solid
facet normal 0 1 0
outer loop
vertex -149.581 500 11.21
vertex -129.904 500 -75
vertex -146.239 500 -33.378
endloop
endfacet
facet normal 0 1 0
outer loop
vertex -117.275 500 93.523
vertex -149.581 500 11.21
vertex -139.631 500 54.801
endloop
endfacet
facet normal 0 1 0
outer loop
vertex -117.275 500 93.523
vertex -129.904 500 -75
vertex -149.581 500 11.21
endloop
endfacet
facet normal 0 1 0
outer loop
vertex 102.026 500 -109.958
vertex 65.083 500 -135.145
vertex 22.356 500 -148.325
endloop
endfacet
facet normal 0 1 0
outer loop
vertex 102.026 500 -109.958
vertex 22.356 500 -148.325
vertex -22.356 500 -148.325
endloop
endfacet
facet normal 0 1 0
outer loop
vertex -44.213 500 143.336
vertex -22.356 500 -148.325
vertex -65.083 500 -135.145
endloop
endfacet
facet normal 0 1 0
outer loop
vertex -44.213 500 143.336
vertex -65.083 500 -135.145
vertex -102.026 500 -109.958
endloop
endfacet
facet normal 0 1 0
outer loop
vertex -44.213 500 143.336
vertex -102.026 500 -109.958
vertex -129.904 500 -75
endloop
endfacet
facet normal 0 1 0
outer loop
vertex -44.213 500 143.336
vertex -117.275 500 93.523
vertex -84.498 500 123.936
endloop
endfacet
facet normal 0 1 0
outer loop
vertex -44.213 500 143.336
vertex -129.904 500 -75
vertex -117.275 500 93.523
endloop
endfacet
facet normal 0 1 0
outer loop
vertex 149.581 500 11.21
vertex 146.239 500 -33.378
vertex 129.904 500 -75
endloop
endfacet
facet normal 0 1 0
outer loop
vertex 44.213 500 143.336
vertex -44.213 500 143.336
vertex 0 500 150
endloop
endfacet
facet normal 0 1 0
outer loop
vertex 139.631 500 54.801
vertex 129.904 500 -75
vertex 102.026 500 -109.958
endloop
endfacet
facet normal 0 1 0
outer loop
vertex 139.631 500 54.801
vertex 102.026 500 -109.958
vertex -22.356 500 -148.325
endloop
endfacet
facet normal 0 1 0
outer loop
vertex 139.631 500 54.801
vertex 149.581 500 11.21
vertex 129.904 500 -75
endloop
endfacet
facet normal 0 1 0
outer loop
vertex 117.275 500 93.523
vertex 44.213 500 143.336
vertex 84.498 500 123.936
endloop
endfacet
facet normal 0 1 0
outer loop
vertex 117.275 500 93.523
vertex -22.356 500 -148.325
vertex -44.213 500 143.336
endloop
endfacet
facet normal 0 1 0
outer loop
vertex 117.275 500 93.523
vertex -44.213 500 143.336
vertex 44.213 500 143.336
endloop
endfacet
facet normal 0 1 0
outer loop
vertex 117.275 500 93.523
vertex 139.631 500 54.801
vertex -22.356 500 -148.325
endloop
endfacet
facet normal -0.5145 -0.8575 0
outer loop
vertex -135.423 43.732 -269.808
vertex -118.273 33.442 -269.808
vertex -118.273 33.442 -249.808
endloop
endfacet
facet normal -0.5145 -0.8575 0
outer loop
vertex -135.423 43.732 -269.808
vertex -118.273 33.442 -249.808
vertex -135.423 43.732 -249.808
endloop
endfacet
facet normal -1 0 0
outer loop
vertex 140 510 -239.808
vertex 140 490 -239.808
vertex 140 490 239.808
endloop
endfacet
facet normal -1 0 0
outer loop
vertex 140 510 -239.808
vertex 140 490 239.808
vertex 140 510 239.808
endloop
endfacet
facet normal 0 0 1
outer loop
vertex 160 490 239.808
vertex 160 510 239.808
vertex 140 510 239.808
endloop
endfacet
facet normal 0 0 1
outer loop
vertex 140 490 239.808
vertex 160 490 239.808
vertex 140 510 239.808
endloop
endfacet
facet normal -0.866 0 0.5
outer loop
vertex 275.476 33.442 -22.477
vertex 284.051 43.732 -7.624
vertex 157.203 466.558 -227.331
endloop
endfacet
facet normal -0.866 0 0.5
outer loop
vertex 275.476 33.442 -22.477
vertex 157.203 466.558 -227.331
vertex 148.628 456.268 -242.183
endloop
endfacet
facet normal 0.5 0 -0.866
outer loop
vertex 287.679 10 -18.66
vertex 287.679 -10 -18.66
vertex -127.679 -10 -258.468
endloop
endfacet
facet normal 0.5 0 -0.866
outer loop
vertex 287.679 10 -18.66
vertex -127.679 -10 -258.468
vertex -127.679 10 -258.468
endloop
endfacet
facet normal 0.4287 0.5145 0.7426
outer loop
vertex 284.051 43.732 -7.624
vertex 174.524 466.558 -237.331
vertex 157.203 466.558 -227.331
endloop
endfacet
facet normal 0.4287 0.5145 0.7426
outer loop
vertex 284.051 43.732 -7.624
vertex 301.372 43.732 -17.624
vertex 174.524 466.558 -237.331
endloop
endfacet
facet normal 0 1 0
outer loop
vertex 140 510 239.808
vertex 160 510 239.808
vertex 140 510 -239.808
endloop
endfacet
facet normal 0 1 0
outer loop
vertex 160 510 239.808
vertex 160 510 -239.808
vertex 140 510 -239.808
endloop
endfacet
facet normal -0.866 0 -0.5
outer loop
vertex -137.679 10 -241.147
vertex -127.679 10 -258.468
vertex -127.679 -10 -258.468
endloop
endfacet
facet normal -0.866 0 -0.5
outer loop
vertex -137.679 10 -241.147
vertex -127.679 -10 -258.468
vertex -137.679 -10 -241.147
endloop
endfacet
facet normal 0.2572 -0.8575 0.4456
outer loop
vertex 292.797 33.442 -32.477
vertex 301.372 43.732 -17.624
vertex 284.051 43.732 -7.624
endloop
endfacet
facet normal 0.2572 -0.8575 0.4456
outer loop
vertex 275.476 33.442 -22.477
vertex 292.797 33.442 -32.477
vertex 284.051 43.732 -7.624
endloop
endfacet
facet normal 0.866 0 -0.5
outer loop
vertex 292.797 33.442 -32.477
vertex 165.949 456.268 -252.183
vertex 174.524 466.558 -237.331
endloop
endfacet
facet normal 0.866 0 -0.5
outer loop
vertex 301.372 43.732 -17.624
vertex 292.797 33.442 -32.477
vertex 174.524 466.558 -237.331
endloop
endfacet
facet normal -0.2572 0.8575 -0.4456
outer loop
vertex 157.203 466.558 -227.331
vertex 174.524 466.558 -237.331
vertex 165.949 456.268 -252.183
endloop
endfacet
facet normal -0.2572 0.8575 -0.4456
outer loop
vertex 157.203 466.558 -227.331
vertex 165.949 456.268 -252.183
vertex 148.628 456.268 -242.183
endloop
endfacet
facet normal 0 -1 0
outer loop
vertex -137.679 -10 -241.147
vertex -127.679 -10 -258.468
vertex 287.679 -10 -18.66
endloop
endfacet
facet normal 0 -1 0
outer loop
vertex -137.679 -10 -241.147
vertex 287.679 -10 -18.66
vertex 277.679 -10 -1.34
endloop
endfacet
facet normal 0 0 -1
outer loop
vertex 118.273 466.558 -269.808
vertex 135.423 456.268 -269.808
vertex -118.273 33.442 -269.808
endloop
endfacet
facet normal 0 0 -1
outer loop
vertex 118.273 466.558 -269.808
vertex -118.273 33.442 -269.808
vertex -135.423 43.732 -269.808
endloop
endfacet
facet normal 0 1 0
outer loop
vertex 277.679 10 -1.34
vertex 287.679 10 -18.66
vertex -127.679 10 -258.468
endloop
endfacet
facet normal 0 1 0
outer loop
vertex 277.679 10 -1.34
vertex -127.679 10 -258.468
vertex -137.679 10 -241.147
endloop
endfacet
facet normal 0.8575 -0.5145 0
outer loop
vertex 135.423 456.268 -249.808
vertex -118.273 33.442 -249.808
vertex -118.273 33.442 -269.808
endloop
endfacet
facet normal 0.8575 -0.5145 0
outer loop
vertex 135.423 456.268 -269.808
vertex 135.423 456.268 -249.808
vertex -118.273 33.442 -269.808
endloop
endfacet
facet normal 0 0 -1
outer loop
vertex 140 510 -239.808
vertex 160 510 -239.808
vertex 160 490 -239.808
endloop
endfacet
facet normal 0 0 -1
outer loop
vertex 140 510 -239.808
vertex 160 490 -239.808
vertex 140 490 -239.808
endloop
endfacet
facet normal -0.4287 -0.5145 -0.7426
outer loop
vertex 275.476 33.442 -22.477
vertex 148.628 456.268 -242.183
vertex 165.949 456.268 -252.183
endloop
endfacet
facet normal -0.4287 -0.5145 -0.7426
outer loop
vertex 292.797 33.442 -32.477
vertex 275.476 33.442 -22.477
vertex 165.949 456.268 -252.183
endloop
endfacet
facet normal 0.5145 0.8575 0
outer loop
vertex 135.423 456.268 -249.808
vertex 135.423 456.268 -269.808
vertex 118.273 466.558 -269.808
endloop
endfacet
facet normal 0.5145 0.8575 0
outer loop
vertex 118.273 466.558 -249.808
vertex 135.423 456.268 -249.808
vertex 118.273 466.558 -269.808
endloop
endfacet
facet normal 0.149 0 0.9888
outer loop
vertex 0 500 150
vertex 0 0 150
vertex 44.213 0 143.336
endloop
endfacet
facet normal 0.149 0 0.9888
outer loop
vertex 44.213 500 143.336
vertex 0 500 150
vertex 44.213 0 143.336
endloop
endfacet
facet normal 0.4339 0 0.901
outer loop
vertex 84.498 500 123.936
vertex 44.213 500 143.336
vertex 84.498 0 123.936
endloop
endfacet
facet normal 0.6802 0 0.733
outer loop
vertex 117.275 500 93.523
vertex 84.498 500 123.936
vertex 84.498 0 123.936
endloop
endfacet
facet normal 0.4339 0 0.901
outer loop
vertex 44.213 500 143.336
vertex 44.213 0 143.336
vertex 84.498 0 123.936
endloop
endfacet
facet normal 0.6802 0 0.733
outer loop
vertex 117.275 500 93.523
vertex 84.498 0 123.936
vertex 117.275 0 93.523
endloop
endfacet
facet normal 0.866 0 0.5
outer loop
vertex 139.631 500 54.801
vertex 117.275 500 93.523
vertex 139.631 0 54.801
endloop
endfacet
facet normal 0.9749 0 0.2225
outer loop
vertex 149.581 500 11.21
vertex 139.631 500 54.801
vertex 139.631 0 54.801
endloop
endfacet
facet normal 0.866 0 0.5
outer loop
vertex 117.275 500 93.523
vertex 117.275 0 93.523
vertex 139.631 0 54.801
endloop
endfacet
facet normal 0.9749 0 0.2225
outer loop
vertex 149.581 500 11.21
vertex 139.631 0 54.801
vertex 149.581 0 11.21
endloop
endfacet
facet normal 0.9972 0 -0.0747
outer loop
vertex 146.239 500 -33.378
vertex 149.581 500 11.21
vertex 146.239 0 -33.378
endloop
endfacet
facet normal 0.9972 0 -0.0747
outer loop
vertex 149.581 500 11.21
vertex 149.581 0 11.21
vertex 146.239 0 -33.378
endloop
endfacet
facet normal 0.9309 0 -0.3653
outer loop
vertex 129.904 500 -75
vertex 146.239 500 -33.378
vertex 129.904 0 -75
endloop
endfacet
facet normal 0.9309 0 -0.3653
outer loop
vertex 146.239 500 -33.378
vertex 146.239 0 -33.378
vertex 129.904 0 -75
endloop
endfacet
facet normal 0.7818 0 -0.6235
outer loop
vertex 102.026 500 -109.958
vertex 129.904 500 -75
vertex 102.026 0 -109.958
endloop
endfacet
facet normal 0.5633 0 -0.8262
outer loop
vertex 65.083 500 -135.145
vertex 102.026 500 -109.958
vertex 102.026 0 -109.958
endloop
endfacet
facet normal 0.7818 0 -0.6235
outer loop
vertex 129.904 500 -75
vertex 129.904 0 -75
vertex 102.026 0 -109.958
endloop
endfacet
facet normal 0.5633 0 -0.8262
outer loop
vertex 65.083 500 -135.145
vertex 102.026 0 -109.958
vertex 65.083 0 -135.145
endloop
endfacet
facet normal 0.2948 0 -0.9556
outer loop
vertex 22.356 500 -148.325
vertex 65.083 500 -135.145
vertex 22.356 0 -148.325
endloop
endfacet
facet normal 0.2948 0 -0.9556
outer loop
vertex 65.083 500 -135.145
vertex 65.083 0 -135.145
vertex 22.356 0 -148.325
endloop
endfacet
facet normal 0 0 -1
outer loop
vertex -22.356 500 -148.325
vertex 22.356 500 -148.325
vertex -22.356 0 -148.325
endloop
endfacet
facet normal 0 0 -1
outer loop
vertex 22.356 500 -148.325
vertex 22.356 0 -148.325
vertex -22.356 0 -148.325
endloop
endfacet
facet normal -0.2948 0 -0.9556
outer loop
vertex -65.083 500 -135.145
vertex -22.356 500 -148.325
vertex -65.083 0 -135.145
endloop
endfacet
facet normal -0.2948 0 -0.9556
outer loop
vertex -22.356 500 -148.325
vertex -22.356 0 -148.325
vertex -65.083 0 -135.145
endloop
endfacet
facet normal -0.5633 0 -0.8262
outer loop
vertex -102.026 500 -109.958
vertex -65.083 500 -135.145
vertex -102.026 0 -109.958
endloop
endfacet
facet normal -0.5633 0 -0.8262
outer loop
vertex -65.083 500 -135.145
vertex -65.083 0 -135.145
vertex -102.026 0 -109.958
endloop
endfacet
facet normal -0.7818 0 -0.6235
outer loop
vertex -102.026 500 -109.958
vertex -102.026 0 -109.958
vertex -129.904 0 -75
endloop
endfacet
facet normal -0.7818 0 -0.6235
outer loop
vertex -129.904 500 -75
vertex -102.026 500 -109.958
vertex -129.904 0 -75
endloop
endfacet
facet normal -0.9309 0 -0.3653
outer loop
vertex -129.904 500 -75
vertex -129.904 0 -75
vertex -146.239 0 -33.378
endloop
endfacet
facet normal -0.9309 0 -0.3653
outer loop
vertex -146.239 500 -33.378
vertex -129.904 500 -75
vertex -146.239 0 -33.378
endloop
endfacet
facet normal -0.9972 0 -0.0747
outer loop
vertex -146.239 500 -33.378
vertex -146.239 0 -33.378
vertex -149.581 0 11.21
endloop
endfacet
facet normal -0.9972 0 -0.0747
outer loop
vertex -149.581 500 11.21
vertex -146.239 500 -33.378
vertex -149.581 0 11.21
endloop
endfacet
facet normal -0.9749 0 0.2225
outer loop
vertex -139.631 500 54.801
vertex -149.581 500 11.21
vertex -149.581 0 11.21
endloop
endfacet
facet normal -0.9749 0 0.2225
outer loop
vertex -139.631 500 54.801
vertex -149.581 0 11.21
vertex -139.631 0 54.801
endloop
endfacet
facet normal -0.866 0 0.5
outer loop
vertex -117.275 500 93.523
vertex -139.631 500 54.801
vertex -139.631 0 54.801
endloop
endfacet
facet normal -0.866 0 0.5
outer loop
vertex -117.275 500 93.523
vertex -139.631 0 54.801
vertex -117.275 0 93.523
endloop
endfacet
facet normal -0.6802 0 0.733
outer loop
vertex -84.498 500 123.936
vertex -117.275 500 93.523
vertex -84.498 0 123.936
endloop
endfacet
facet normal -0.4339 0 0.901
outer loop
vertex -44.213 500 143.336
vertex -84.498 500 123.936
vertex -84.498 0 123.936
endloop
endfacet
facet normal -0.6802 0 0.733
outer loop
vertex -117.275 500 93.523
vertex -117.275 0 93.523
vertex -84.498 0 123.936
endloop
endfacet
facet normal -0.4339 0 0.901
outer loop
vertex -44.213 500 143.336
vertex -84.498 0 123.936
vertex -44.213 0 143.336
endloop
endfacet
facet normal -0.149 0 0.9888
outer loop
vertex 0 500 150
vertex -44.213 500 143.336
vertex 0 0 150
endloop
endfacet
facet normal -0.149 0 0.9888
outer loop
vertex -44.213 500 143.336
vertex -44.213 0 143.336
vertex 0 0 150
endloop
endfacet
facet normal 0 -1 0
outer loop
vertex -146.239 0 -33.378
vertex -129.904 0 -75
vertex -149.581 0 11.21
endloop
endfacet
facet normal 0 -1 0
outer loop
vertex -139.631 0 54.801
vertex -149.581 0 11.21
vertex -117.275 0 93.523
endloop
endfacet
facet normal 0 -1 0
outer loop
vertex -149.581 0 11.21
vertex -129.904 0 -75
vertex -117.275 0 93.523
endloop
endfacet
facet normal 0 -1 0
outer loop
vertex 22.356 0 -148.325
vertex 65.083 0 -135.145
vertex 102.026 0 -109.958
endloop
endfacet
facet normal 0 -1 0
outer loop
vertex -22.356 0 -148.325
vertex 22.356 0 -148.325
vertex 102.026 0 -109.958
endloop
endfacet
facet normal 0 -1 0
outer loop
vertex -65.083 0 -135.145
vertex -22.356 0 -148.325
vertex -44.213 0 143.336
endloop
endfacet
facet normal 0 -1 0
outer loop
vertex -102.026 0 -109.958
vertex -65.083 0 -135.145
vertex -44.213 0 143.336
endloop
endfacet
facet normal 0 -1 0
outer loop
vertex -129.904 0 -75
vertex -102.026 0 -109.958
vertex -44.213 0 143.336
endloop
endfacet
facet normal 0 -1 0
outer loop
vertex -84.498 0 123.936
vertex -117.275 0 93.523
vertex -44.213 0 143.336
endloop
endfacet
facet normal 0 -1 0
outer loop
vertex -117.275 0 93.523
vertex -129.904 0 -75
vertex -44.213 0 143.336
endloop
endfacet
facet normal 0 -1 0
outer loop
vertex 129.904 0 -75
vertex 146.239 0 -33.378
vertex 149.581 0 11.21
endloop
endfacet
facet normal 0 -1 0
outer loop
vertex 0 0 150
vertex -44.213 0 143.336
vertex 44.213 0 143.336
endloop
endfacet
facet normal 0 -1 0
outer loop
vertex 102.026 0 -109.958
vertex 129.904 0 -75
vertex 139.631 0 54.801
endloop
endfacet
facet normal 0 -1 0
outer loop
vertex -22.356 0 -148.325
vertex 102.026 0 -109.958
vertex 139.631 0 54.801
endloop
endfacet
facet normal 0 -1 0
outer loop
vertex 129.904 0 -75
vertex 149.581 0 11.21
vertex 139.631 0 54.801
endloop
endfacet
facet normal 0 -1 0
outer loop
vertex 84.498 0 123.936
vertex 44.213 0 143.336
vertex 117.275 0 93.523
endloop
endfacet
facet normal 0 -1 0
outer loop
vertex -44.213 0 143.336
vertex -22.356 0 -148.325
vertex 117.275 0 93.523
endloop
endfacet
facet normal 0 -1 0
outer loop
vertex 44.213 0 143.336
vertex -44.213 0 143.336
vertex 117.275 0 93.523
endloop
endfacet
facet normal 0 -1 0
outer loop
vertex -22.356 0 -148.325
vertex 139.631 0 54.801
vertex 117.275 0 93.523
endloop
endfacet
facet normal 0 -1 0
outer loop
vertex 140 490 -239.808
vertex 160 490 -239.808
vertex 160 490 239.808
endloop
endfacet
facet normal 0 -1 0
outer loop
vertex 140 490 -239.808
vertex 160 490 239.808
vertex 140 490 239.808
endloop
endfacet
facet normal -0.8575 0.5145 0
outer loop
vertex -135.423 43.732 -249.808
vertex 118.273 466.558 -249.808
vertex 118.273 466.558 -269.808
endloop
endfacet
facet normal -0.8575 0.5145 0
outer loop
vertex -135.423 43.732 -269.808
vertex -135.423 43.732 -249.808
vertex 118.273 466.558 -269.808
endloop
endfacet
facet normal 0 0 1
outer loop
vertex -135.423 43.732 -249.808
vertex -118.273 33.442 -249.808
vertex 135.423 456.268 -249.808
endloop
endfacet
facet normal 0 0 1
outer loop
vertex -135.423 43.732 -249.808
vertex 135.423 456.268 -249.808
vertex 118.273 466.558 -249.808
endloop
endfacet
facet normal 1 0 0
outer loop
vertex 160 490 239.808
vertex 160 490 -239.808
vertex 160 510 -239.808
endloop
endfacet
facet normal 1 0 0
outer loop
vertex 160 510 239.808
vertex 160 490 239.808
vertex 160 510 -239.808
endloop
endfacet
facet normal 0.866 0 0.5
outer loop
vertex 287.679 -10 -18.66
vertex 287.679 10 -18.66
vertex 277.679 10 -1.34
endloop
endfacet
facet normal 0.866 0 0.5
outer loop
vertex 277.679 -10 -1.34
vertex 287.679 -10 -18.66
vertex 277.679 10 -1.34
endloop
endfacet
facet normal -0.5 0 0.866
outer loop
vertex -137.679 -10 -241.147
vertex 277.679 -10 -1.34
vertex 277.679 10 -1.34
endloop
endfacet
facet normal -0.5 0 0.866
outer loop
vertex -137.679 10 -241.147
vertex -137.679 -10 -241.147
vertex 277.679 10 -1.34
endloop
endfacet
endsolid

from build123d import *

# Parameters (mm, degrees)
CROQUIS4_R              = 150
SALIENTE_EXTRUIR1_DEPTH = 500
CROQUIS5_W              = 20
CROQUIS5_H              = 20
SALIENTE_EXTRUIR2_DEPTH = 246.547594742
CROQUIS6_W              = 20
CROQUIS6_H              = 20
SALIENTE_EXTRUIR3_DEPTH = 239.807621135
SALIENTE_EXTRUIR4_DEPTH = 246.547594742
CROQUIS8_W              = 20
CROQUIS8_H              = 20
SALIENTE_EXTRUIR5_DEPTH = 239.807621135


with BuildPart() as part:
    # Croquis4 → Saliente-Extruir1 (new body)
    with BuildSketch(Plane(origin=(0, 0, 0), x_dir=(1, 0, 0), z_dir=(0, 1, 0))):
        with Locations(Location((0, 0, 0), (0, 0, 270))):
            Circle(CROQUIS4_R)
    extrude(amount=SALIENTE_EXTRUIR1_DEPTH)


with BuildPart() as body_2:
    # Croquis5 → Saliente-Extruir2 (new, symmetric)
    with BuildSketch(Plane(origin=(110.294117647, 183.823529412, 0), x_dir=(-0.8574929257125442, 0.5144957554275267, 0), z_dir=(-0.5144957554275266, -0.8574929257125441, 0))):
        with Locations((128.623938857, 259.807621135)):
            Rectangle(CROQUIS5_W, CROQUIS5_H)
    extrude(amount=SALIENTE_EXTRUIR2_DEPTH, both=True)


with BuildPart() as body_3:
    # Croquis6 → Saliente-Extruir3 (new, symmetric)
    with BuildSketch(Plane(origin=(0, 0, 0), x_dir=(-1, 0, 0), z_dir=(0, 0, -1))):
        with Locations((-150, 500)):
            Rectangle(CROQUIS6_W, CROQUIS6_H)
    extrude(amount=SALIENTE_EXTRUIR3_DEPTH, both=True)


with BuildPart() as body_4:
    # Croquis7 → Saliente-Extruir4 (new, symmetric)
    with BuildSketch(Plane(origin=(-55.147058824, 183.823529412, -95.51750777), x_dir=(-0.9658390305087126, -0.24307639633206138, 0.08982668140485241), z_dir=(0.257247877713763, -0.8574929257125443, 0.4455663943395036))):
        Polygon((-303.289809836, 5.295290027), (-285.662720294, -4.153821798), (-276.213608469, 13.473267744), (-293.840698011, 22.922379569), align=None)
    extrude(amount=SALIENTE_EXTRUIR4_DEPTH, both=True)


with BuildPart() as body_5:
    # Croquis8 → Saliente-Extruir5 (new, symmetric)
    with BuildSketch(Plane(origin=(0, 0, 0), x_dir=(-0.5000000000000003, 0, 0.8660254037844386), z_dir=(-0.8660254037844385, 0, -0.5000000000000002))):
        with Locations((-150, 0)):
            Rectangle(CROQUIS8_W, CROQUIS8_H)
    extrude(amount=SALIENTE_EXTRUIR5_DEPTH, both=True)


solid = Compound([part.part, body_2.part, body_3.part, body_4.part, body_5.part])
